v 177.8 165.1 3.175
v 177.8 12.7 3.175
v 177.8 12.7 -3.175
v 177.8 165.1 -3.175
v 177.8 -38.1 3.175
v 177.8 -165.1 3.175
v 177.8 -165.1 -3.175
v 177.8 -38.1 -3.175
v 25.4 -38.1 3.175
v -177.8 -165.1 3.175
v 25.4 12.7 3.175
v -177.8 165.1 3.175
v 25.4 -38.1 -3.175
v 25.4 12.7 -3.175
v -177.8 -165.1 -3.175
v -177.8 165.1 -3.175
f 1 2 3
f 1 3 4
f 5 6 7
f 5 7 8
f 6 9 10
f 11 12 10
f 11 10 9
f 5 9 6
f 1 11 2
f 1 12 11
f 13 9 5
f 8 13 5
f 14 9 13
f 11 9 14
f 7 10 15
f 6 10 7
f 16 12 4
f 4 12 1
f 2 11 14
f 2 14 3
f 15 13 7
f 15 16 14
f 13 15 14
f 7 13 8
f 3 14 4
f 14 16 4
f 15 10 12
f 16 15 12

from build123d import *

# Parameters (mm, degrees)
SKETCH1_W           = 355.6
SKETCH1_H           = 330.2
BOSS_EXTRUDE1_DEPTH = 3.175
SKETCH3_W           = 152.4
SKETCH3_H           = 50.8
CUT_EXTRUDE1_DEPTH  = 7.35


with BuildPart() as part:
    # Sketch1 → Boss-Extrude1 (new body, symmetric)
    with BuildSketch(Plane.XY):
        Rectangle(SKETCH1_W, SKETCH1_H)
    extrude(amount=BOSS_EXTRUDE1_DEPTH, both=True)

    # Sketch3 → Cut-Extrude1 (cut, through all)
    with BuildSketch(Plane.XY.offset(3.175)):
        with Locations((101.6, -12.7)):
            Rectangle(SKETCH3_W, SKETCH3_H)
    extrude(amount=-CUT_EXTRUDE1_DEPTH, mode=Mode.SUBTRACT)


solid = part.part
